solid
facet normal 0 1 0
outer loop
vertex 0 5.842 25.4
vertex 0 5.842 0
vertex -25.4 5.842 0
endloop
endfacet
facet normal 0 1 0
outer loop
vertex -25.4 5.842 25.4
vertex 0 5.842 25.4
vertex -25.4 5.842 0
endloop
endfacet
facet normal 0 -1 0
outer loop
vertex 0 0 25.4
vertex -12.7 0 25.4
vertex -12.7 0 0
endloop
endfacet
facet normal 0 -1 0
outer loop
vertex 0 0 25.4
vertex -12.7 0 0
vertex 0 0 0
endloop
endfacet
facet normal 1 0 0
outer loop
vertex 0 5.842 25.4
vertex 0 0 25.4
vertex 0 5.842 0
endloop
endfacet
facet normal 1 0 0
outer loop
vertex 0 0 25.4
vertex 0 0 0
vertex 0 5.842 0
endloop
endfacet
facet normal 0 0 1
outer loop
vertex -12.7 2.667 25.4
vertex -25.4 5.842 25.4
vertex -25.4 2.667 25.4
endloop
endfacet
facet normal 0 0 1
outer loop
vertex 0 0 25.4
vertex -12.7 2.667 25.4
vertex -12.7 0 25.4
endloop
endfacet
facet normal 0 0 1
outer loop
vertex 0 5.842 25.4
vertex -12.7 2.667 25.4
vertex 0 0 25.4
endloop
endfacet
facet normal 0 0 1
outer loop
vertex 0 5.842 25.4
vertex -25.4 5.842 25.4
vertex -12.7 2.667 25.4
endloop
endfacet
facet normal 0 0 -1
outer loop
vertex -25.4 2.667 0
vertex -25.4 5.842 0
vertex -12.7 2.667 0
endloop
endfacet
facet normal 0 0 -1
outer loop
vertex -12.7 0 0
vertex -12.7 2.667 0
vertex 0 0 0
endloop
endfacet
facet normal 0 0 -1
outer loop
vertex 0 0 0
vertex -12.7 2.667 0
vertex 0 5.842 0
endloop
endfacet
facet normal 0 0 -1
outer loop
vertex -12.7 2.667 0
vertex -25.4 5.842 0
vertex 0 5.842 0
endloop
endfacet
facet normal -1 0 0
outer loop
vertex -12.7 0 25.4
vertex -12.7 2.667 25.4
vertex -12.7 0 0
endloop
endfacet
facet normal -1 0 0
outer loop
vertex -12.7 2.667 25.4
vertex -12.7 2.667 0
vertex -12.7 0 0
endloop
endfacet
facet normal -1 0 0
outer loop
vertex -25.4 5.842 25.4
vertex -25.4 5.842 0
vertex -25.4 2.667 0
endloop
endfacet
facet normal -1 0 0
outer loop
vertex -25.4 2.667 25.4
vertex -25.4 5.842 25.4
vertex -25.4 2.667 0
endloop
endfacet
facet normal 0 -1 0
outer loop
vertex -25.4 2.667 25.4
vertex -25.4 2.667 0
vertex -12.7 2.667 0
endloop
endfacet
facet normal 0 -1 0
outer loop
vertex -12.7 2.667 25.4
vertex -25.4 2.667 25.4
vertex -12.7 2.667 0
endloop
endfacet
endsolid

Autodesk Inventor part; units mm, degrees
ref_plane "YZ Plane" through (0, 0, 0) normal (1, 0, 0) x (0, 1, 0)
ref_plane "XZ Plane" through (0, 0, 0) normal (0, 1, 0) x (-1, 0, 0)
ref_plane "XY Plane" through (0, 0, 0) normal (0, 0, 1) x (1, 0, 0)
sketch "Sketch1" plane through (0, 0, 0) normal (0, 0, 1) x (1, 0, 0)
  line L0 (0, 0) -> (0, 5.842)
  line L1 (0, 0) -> (5.842, 0) construction
  line L2 (0, 5.842) -> (-25.4, 5.842)
  line L3 (0, 5.842) -> (25.4, 5.842) construction
  line L4 (-25.4, 5.842) -> (-25.4, 2.667)
  line L5 (-25.4, 2.667) -> (-12.7, 2.667)
  line L6 (-25.4, 2.667) -> (-12.7, 2.667) construction
  line L7 (-12.7, 2.667) -> (-12.7, 0)
  line L8 (-12.7, 0) -> (0, 0)
  dimension "d0" = 5.842
  dimension "d1" = 90
  dimension "d2" = 25.4
  dimension "d3" = 180
  dimension "d4" = 3.175
  dimension "d5" = 12.7
  dimension "d6" = 0
extrude "Extrusion1" add sketch "Sketch1" along normal blind 25.4
properties part number "ToteBasinBracket"
